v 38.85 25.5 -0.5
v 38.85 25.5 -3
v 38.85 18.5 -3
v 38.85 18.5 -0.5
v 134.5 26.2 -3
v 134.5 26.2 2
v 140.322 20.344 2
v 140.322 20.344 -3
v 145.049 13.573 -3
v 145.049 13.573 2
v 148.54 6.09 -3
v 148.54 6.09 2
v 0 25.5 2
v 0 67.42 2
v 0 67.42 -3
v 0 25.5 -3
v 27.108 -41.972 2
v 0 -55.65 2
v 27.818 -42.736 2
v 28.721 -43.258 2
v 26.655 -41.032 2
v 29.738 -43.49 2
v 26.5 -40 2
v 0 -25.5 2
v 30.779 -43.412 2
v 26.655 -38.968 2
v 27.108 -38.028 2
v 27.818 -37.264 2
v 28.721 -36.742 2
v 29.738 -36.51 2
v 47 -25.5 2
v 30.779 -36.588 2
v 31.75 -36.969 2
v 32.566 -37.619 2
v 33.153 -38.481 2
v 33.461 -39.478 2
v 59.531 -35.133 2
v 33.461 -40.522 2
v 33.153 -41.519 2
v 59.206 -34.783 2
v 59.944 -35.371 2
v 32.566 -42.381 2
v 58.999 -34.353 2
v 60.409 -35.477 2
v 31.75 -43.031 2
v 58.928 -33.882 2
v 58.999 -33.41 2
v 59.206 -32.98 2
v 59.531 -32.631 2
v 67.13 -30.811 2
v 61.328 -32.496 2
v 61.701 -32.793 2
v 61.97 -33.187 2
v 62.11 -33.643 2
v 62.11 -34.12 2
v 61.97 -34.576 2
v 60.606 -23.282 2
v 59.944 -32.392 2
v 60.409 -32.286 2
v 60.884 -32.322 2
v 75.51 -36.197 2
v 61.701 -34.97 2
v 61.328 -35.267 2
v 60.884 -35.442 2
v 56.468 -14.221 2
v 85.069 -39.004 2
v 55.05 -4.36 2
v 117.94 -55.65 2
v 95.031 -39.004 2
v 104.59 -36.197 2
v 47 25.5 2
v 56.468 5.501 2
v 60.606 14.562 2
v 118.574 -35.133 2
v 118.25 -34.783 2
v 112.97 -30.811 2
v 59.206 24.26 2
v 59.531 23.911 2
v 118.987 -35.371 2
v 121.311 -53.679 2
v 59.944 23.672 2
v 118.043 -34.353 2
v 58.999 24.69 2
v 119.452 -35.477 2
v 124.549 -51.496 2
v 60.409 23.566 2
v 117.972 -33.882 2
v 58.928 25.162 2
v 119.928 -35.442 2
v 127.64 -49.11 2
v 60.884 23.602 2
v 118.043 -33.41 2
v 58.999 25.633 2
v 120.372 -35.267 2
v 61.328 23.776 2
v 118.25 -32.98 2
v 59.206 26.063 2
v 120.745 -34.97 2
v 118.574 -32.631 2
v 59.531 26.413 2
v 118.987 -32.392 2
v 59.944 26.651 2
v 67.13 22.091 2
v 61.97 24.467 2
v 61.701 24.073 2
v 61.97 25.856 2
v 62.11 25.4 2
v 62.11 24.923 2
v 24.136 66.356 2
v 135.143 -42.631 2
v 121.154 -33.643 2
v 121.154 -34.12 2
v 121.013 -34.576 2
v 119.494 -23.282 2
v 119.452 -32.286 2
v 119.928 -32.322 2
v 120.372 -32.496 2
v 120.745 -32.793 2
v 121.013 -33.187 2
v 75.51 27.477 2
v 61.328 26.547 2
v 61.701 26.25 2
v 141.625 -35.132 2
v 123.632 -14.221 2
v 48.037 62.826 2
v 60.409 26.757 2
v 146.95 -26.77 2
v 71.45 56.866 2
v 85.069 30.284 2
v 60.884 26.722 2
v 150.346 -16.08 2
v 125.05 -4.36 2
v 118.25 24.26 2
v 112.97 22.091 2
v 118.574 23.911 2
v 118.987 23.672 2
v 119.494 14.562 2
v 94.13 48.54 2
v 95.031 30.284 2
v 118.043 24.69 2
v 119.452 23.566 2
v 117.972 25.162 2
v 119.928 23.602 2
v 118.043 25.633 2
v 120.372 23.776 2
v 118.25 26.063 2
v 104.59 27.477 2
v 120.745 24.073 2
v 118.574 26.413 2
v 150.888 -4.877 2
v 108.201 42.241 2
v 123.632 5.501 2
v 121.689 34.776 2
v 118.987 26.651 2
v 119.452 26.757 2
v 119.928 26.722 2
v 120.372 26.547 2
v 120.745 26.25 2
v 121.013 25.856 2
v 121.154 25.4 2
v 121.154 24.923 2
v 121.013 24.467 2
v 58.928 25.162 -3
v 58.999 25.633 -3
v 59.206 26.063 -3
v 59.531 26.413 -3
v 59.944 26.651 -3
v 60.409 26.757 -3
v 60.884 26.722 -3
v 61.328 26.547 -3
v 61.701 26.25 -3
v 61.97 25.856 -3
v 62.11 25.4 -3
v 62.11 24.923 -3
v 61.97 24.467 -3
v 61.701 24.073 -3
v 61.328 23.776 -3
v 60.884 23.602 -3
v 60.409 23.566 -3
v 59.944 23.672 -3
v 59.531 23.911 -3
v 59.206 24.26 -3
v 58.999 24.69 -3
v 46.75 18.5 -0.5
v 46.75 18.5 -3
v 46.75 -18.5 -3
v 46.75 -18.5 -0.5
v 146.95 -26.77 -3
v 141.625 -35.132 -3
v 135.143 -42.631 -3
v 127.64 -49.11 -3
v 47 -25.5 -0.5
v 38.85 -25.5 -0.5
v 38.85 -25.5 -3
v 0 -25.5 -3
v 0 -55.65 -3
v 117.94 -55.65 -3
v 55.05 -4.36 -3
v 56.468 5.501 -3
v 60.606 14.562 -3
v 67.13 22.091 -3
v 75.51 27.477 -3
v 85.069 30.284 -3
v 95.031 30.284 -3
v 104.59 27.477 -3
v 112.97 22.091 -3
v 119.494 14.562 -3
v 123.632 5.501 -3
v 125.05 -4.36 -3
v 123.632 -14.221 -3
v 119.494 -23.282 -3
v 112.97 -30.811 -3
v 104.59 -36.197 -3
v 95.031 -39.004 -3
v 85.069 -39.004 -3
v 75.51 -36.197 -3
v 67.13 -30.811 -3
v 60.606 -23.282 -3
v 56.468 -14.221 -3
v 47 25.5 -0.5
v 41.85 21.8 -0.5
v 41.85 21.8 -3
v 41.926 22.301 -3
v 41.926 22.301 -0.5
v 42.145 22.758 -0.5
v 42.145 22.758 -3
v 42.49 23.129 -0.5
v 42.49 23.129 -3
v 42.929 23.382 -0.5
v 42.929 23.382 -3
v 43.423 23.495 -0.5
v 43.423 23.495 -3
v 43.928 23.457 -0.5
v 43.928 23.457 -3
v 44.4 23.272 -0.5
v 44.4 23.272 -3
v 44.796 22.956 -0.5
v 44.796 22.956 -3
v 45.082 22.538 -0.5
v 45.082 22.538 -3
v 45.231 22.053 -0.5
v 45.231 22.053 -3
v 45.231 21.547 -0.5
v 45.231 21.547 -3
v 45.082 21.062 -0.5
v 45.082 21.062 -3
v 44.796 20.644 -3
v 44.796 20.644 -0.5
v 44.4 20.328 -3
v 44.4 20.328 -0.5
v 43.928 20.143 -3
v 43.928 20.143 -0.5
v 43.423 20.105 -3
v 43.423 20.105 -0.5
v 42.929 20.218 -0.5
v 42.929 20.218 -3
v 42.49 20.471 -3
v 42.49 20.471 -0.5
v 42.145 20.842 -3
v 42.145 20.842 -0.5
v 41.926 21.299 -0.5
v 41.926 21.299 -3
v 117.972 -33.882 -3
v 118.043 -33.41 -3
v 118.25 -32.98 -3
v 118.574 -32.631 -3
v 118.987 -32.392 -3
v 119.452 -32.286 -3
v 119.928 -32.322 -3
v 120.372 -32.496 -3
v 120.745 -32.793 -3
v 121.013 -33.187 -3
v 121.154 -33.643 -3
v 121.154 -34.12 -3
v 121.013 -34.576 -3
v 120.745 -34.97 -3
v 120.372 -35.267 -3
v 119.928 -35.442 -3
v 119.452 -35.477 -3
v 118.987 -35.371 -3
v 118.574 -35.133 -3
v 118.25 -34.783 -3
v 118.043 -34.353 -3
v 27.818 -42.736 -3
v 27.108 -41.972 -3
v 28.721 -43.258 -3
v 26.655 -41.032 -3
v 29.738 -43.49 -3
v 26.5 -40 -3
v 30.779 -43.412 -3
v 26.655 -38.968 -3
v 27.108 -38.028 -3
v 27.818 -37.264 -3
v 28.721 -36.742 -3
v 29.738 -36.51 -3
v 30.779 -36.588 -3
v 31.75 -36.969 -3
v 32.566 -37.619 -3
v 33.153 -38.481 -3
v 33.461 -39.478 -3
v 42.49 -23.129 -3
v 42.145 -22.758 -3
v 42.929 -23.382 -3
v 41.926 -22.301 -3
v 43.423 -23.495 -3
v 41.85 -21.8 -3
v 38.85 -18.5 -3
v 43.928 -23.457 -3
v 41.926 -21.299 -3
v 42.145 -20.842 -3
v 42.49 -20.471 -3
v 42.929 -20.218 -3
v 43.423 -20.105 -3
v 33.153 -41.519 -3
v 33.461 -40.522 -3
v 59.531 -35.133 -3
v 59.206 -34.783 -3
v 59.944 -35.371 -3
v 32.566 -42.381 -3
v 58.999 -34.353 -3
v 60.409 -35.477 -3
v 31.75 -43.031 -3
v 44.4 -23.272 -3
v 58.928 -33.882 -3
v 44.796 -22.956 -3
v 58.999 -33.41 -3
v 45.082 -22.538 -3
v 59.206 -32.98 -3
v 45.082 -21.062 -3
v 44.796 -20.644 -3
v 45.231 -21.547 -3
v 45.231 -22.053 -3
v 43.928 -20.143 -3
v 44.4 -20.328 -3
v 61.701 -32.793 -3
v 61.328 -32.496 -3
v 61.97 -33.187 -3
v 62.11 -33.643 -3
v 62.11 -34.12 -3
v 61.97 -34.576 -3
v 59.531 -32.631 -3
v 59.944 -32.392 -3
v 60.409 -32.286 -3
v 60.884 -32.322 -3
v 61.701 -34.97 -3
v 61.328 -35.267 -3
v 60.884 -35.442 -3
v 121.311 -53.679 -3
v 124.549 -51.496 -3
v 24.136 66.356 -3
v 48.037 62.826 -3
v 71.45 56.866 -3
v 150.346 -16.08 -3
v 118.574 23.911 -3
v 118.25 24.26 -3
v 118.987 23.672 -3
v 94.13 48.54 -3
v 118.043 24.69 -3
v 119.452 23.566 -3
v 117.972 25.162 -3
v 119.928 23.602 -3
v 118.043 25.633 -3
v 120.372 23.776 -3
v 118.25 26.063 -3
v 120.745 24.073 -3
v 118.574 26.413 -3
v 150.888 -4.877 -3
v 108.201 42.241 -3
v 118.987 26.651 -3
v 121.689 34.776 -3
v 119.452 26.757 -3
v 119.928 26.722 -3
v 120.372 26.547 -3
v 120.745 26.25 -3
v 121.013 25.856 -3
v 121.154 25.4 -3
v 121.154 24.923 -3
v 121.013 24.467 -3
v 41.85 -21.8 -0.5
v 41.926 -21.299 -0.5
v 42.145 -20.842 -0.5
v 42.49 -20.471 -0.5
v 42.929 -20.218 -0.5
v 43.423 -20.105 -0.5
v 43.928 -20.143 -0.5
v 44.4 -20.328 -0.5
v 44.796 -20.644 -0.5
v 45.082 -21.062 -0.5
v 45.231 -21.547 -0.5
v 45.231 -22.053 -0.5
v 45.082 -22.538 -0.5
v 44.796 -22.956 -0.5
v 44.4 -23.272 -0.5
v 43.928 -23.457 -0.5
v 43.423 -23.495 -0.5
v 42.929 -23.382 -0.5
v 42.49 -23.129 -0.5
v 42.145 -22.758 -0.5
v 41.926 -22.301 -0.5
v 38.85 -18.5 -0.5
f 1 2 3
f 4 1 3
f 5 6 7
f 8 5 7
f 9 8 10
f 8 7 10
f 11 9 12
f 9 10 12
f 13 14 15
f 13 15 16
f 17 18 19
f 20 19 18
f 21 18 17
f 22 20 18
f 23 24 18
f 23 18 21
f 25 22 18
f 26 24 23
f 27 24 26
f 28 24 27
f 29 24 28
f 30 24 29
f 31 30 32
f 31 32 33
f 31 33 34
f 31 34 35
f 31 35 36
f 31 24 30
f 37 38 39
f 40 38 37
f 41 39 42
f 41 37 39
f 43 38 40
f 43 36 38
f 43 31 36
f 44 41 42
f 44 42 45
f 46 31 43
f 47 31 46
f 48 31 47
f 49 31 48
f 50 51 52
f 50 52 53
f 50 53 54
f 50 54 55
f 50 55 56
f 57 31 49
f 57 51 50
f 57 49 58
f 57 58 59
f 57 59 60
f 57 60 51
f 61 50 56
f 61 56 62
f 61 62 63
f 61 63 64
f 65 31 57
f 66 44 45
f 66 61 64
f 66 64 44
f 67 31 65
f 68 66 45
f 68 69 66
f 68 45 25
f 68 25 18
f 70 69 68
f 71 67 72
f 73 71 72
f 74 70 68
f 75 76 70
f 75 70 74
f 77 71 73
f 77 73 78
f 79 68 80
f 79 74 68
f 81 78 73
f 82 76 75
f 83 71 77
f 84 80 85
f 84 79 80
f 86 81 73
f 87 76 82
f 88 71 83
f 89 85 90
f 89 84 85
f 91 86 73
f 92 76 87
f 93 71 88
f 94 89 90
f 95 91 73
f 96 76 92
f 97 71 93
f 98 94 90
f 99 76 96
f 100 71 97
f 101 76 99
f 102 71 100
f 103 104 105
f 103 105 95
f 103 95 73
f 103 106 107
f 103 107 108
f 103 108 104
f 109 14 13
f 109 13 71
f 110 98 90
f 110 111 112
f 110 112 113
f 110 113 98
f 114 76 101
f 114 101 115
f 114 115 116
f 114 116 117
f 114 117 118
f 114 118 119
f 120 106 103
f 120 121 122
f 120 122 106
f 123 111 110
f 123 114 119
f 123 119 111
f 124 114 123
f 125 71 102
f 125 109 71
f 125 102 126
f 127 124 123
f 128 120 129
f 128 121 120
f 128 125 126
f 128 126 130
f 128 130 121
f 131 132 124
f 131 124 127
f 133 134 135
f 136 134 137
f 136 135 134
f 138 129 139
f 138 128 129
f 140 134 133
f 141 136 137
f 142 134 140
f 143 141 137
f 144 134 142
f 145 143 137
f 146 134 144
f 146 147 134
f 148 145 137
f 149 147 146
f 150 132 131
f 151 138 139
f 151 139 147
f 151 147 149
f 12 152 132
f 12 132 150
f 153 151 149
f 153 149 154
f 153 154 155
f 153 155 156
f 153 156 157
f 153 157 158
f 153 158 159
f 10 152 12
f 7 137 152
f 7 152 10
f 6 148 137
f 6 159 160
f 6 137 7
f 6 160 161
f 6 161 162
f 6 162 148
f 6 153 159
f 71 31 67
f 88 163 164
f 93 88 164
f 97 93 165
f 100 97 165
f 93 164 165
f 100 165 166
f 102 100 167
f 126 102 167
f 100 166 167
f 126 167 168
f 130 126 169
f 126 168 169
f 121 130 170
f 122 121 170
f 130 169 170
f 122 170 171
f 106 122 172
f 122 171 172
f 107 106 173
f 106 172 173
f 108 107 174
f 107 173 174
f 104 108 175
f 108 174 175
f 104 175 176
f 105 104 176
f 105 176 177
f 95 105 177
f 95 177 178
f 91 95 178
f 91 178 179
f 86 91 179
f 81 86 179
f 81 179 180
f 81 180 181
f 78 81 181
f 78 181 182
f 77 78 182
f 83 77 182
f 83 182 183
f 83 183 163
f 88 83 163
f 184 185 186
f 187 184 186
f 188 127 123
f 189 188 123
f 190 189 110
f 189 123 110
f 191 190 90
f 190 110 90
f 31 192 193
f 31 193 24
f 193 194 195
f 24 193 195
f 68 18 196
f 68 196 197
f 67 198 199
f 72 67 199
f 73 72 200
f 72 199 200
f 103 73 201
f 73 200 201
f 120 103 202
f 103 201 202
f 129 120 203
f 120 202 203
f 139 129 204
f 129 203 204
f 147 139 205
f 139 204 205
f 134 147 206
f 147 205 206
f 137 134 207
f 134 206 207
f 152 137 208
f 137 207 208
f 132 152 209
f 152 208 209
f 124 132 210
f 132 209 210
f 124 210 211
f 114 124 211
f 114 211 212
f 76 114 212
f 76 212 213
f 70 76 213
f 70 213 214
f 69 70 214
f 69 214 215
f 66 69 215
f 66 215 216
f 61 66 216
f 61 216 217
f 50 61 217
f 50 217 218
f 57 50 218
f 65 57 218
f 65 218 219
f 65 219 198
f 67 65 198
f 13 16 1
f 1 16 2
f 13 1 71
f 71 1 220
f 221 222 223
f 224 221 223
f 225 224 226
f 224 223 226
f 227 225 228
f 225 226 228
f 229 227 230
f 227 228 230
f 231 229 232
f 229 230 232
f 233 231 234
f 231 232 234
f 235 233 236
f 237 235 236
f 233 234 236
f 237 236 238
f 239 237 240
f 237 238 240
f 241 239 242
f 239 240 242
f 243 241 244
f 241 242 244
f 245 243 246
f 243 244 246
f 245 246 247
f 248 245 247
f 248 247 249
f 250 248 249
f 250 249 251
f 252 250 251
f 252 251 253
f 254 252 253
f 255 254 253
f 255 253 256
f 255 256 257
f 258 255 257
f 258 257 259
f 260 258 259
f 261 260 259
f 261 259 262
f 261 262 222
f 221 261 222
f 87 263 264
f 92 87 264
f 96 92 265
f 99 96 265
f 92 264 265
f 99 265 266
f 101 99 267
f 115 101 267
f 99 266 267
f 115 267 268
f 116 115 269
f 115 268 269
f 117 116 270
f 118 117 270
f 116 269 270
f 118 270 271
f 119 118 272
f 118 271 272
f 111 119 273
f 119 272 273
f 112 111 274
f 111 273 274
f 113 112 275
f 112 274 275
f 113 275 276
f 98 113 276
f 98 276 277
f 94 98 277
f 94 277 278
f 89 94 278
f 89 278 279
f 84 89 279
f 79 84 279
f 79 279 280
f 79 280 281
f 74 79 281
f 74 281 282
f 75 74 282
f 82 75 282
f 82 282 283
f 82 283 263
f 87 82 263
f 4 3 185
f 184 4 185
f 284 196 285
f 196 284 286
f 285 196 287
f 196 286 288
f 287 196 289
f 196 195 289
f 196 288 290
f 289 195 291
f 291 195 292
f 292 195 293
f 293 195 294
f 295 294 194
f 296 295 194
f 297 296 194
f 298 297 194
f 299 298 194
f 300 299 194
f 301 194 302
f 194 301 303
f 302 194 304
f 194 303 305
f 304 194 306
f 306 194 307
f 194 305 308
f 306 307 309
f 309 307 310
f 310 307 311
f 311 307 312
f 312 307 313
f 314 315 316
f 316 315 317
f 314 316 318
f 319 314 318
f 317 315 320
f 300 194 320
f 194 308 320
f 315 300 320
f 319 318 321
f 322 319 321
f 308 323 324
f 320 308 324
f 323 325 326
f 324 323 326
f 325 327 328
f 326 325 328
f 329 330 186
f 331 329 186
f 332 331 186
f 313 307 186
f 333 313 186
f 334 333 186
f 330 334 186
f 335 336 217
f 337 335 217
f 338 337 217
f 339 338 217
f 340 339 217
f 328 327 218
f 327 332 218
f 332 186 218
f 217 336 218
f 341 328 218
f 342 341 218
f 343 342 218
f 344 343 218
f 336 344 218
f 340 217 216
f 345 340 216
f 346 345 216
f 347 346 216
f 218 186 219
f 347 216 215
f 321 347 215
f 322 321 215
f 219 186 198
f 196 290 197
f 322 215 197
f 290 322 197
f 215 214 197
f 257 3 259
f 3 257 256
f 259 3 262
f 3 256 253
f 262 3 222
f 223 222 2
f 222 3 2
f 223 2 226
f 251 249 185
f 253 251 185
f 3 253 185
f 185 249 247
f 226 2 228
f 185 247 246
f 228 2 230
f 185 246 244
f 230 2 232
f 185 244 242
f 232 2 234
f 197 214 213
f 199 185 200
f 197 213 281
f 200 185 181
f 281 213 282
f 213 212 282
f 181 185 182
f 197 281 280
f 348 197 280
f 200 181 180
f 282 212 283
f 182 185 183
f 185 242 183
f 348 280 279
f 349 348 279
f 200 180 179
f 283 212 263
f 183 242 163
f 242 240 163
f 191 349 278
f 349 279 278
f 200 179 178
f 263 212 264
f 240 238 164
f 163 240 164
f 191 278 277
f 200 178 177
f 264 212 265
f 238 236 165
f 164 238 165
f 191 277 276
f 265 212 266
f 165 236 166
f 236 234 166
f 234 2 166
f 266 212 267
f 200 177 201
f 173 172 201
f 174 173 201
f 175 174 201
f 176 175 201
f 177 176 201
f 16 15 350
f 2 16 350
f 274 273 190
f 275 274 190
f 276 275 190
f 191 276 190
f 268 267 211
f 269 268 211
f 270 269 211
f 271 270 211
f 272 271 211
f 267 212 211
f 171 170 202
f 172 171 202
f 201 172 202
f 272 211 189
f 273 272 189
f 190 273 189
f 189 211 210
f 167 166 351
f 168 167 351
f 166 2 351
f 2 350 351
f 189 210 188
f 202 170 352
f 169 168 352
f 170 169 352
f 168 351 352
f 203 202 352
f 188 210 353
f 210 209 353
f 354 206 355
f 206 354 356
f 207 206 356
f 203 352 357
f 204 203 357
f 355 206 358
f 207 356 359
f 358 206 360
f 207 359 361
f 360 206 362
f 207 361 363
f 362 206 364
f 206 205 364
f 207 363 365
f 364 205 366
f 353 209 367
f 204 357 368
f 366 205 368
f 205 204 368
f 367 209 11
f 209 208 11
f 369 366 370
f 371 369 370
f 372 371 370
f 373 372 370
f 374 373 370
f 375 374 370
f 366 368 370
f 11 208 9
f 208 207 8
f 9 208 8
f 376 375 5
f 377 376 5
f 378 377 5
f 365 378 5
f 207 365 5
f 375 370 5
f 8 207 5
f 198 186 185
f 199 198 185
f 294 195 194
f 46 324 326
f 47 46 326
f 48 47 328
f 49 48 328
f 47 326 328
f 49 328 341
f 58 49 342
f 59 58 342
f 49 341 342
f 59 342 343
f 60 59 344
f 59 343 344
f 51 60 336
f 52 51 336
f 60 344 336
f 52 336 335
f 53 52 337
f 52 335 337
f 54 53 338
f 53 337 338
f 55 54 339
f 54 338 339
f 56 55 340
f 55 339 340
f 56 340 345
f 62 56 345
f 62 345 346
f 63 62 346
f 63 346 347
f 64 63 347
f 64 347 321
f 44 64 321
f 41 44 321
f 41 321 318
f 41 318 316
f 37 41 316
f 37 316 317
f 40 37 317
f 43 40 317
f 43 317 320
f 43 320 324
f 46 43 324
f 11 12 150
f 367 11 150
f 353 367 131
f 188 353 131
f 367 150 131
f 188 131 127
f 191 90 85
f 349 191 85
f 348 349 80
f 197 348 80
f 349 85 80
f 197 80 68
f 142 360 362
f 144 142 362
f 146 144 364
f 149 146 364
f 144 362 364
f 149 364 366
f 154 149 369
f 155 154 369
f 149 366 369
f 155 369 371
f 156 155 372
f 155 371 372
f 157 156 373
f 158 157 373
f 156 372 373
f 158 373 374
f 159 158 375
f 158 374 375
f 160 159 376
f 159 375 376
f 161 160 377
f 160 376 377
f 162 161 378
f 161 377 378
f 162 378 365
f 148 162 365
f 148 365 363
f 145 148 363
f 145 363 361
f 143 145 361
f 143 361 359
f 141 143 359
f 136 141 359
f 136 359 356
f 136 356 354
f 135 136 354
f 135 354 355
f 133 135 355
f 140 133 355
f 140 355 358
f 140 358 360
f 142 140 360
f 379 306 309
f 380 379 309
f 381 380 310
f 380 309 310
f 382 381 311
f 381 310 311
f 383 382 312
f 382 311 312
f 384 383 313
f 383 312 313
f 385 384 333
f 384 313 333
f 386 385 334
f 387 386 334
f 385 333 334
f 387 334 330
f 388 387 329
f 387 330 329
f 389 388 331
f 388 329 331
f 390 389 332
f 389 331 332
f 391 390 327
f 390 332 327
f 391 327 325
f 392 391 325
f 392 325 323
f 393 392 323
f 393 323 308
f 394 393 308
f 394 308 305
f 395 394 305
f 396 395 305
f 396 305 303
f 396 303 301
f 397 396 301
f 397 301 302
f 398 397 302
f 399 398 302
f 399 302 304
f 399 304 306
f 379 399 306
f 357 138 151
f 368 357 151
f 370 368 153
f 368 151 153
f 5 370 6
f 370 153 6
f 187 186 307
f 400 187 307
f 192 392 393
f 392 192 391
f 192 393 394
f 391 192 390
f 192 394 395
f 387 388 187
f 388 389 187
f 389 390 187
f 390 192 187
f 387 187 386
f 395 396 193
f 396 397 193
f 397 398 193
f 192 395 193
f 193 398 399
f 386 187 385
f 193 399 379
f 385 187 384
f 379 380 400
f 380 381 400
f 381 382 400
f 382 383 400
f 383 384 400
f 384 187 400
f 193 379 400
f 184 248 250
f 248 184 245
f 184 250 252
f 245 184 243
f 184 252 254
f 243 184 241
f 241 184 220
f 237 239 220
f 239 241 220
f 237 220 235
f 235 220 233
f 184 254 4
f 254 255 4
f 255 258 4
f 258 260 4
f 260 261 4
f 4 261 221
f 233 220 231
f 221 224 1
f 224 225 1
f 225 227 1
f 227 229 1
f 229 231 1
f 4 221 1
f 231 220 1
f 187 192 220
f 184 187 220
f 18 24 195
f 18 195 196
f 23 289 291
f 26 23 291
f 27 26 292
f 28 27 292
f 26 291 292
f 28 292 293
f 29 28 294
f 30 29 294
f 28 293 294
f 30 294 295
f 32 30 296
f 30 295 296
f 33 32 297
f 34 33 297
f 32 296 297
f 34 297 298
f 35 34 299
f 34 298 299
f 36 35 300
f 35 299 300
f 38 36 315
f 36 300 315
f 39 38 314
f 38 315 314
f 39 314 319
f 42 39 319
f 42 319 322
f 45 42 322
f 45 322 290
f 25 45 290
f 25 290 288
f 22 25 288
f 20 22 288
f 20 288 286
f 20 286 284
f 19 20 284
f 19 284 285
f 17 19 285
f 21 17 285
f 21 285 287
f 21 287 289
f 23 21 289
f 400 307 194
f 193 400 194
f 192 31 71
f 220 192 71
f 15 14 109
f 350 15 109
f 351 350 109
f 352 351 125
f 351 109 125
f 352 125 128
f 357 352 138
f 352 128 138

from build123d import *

# Parameters (mm, degrees)
PAD002_DEPTH            = 5
SKETCH015_R             = 35
SKETCH015_R_2           = 1.6
POCKET005_DEPTH         = 5.001
SKETCH013_R             = 3.5
SKETCH013_R_2           = 1.7
POCKET004_DEPTH         = 5.001
SKETCH025_W             = 47
SKETCH025_H             = 51
POCKET027_DEPTH         = 2.5
BODY002_PLACEMENT_ANGLE = 180


with BuildPart() as part:
    # Sketch014 → Pad002 (new body)
    with BuildSketch(Plane.XY):
        with BuildLine():
            Line((0, 67.42), (0, -55.65))
            Line((0, -55.65), (-117.94, -55.65))
            ThreePointArc((-127.64, -49.11), (-122.947197, -52.613151), (-117.94, -55.65))
            ThreePointArc((-146.95, -26.77), (-138.520798, -38.999541), (-127.64, -49.11))
            ThreePointArc((-148.54, 6.09), (-150.980867, -10.496574), (-146.95, -26.77))
            ThreePointArc((-134.5, 26.2), (-142.831473, 17.060618), (-148.54, 6.09))
            ThreePointArc((-94.13, 48.54), (-115.023795, 38.650843), (-134.5, 26.2))
            ThreePointArc((0, 67.42), (-48.036997, 62.826084), (-94.13, 48.54))
        make_face()
    extrude(amount=PAD002_DEPTH)

    # Sketch015 (on Face10 of Pad002) → Pocket005 (cut, through all)
    with BuildSketch(Plane.XY.offset(5)):
        with Locations((-90.05, -4.36)):
            Circle(SKETCH015_R)
        with Locations((-119.571708, 25.161708)):
            Circle(SKETCH015_R_2)
        with Locations((-60.528292, 25.161708)):
            Circle(SKETCH015_R_2)
        with Locations((-60.528292, -33.881708)):
            Circle(SKETCH015_R_2)
        with Locations((-119.571708, -33.881708)):
            Circle(SKETCH015_R_2)
    extrude(amount=-POCKET005_DEPTH, mode=Mode.SUBTRACT)

    # Sketch013 (on Face5 of Pocket005) → Pocket004 (cut, through all)
    with BuildSketch(Plane.XY.offset(5)):
        with Locations((-30, -40)):
            Circle(SKETCH013_R)
        with Locations((-43.55, 21.8)):
            Circle(SKETCH013_R_2)
        with Locations((-43.55, -21.8)):
            Circle(SKETCH013_R_2)
        Polygon((0, 25.5), (-38.85, 25.5), (-38.85, 18.5), (-46.75, 18.5), (-46.75, -18.5), (-38.85, -18.5), (-38.85, -25.5), (0, -25.5), align=None)
    extrude(amount=-POCKET004_DEPTH, mode=Mode.SUBTRACT)

    # Sketch025 → Pocket027 (cut)
    with BuildSketch(Plane.XY):
        with Locations((-23.5, 0)):
            Rectangle(SKETCH025_W, SKETCH025_H)
    extrude(amount=POCKET027_DEPTH, mode=Mode.SUBTRACT)


with BuildPart() as part_1:
    # Body002 placement: moved
    add(part.part.moved(Location((0, 0, 2))).rotate(Axis((0, 0, 2), (0, 1, 0)), BODY002_PLACEMENT_ANGLE))


solid = part_1.part
